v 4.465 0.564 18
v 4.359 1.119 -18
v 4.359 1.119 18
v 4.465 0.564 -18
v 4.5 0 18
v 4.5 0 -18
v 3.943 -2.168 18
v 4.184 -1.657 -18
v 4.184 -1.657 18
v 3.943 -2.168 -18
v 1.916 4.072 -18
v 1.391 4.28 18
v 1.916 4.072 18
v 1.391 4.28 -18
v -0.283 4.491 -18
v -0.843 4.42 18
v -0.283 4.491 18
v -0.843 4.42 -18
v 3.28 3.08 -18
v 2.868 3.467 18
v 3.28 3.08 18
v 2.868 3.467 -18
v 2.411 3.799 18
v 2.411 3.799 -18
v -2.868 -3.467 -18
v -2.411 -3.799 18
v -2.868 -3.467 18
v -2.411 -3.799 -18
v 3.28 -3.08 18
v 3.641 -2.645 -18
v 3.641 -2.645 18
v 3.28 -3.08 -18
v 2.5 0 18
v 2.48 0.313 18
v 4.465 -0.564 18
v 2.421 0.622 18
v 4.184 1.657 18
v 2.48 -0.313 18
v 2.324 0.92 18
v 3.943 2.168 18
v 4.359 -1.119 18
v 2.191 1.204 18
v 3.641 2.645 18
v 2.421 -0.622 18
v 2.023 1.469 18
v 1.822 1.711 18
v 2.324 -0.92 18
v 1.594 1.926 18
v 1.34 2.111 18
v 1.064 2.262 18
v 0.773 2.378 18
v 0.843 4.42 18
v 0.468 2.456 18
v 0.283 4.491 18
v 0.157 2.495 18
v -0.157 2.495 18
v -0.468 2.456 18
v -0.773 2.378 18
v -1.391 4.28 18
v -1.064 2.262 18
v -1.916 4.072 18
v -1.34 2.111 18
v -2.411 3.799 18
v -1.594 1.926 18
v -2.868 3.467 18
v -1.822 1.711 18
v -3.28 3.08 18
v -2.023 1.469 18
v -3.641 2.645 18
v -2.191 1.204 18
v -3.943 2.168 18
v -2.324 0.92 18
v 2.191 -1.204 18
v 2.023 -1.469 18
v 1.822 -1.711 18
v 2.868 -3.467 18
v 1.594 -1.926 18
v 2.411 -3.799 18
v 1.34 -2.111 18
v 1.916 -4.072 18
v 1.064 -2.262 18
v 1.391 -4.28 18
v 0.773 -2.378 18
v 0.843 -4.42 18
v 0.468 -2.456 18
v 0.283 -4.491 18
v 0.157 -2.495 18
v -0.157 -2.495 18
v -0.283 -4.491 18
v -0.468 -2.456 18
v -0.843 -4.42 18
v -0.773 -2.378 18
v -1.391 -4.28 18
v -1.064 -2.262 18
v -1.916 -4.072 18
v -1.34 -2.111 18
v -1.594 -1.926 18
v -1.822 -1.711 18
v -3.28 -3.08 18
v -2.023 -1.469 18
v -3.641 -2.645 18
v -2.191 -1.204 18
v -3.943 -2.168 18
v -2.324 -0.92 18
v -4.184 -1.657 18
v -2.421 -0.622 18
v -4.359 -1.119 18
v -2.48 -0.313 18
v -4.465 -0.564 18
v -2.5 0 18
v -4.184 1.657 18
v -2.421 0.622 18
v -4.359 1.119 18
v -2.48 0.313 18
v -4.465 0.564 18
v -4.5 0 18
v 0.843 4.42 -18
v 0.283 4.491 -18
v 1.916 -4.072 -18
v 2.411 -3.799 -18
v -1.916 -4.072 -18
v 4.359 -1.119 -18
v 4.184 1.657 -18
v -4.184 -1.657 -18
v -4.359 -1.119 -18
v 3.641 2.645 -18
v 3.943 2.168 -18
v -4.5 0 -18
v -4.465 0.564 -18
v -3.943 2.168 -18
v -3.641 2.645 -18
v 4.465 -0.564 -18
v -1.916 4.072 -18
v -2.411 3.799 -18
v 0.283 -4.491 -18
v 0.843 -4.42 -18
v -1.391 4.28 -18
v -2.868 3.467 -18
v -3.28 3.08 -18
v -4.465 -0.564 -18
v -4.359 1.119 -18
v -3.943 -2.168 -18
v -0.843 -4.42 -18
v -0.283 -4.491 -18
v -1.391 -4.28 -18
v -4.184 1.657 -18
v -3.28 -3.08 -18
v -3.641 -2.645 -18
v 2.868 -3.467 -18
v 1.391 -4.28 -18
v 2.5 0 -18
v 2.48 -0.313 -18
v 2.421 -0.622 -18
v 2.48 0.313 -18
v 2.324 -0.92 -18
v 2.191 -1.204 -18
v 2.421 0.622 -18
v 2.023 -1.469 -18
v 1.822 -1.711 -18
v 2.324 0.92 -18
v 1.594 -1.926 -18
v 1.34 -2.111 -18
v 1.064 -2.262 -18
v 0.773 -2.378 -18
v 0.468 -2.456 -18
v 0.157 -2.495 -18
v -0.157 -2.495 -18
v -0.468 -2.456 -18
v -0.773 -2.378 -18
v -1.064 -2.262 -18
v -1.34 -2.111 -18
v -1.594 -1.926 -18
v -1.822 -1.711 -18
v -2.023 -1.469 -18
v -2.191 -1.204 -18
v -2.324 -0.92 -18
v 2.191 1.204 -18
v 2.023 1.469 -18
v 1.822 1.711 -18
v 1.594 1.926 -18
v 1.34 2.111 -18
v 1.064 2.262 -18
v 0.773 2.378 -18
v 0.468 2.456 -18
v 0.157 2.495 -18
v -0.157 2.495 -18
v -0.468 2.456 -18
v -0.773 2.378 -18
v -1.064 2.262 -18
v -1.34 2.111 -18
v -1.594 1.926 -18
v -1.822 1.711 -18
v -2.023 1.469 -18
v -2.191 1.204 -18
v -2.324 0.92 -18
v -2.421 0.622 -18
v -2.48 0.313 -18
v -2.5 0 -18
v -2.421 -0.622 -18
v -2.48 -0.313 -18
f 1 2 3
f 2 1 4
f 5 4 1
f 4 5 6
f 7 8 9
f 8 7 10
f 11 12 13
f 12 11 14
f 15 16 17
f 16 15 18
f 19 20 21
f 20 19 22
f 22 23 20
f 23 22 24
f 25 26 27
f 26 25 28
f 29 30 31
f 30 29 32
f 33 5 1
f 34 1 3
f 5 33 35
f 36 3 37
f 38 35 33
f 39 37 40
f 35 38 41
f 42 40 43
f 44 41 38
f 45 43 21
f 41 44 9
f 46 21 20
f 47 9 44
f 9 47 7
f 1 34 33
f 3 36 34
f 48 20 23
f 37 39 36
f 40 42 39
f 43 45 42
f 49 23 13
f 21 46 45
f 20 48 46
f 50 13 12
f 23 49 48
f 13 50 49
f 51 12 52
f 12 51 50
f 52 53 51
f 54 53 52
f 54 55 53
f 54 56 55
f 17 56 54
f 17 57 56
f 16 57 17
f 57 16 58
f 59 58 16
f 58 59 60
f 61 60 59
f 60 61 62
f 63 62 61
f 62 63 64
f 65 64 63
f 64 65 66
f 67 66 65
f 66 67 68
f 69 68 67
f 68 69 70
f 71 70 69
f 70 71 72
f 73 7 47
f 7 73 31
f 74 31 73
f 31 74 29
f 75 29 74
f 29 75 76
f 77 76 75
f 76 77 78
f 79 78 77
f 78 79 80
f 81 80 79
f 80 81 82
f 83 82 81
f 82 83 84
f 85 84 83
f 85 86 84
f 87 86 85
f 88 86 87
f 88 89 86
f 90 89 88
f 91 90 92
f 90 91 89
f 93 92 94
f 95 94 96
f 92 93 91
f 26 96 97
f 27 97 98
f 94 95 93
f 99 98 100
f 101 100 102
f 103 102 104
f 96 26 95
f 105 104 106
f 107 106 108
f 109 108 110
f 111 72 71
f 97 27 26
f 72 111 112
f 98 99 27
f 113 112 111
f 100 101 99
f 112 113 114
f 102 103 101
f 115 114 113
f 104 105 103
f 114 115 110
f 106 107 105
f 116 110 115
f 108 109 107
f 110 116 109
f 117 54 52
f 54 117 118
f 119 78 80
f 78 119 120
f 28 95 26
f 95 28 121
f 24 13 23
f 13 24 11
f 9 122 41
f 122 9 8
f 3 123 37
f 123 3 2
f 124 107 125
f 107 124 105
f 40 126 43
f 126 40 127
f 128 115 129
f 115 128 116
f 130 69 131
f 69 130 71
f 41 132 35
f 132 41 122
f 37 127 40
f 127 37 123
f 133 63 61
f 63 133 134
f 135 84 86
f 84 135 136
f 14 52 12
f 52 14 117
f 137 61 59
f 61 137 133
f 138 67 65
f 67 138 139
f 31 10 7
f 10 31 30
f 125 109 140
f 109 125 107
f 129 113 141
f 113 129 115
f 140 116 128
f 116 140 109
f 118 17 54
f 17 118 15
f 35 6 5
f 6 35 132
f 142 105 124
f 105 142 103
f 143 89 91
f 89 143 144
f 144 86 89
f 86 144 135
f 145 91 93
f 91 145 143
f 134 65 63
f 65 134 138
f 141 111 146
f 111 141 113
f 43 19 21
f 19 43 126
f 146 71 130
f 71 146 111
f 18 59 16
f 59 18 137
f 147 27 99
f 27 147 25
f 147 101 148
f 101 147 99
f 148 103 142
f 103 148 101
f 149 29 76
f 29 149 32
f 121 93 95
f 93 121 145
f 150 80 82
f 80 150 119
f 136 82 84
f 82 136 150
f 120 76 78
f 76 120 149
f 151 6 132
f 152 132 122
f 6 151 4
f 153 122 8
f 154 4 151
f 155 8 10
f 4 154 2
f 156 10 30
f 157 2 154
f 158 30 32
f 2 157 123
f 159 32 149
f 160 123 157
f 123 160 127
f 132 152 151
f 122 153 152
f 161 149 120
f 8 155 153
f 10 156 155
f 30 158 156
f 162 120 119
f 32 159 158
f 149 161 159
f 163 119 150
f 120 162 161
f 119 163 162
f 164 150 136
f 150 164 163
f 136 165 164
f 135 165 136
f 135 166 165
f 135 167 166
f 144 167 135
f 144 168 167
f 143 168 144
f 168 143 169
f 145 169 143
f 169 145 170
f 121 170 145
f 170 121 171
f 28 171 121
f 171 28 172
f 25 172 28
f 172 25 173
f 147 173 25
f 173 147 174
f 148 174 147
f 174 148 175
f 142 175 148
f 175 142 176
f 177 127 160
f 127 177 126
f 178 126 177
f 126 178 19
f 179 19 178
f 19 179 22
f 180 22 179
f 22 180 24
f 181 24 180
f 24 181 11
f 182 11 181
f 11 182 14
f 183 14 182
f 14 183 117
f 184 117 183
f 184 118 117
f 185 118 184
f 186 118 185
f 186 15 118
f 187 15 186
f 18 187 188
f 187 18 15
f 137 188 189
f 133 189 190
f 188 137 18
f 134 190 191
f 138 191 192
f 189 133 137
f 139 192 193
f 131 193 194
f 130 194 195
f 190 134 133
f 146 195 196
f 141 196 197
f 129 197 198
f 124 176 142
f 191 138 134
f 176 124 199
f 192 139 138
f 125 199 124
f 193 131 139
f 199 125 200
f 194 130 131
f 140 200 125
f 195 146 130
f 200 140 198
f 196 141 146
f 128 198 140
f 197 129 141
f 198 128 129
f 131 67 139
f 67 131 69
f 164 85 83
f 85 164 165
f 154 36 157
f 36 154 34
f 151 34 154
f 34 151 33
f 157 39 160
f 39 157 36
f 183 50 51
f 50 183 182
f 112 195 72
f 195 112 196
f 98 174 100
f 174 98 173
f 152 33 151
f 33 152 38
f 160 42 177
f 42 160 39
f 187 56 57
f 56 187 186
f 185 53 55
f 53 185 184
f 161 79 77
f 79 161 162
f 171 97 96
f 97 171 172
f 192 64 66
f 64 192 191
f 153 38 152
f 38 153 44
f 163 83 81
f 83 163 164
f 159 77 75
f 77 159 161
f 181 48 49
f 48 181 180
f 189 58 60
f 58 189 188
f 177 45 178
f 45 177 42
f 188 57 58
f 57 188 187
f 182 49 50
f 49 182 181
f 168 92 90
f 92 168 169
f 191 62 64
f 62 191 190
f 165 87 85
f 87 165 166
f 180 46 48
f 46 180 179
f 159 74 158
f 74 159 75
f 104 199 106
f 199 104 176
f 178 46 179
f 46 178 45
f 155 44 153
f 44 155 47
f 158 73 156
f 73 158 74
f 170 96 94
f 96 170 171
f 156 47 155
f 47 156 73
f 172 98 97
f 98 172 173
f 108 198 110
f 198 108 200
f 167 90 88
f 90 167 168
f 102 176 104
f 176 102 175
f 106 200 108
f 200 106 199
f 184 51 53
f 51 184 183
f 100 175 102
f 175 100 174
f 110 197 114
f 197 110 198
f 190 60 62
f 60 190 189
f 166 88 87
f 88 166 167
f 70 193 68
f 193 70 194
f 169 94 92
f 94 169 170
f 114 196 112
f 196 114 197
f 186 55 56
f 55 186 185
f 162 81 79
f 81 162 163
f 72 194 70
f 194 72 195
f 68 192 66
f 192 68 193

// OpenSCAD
$fn = 50;


difference() {
	union() {
		translate(v = [0, 0, -18.0000000000]) {
			cylinder(h = 36, r = 4.5000000000);
		}
	}
	union() {
		translate(v = [0, 0, -100.0000000000]) {
			cylinder(h = 200, r = 2.5000000000);
		}
	}
}
